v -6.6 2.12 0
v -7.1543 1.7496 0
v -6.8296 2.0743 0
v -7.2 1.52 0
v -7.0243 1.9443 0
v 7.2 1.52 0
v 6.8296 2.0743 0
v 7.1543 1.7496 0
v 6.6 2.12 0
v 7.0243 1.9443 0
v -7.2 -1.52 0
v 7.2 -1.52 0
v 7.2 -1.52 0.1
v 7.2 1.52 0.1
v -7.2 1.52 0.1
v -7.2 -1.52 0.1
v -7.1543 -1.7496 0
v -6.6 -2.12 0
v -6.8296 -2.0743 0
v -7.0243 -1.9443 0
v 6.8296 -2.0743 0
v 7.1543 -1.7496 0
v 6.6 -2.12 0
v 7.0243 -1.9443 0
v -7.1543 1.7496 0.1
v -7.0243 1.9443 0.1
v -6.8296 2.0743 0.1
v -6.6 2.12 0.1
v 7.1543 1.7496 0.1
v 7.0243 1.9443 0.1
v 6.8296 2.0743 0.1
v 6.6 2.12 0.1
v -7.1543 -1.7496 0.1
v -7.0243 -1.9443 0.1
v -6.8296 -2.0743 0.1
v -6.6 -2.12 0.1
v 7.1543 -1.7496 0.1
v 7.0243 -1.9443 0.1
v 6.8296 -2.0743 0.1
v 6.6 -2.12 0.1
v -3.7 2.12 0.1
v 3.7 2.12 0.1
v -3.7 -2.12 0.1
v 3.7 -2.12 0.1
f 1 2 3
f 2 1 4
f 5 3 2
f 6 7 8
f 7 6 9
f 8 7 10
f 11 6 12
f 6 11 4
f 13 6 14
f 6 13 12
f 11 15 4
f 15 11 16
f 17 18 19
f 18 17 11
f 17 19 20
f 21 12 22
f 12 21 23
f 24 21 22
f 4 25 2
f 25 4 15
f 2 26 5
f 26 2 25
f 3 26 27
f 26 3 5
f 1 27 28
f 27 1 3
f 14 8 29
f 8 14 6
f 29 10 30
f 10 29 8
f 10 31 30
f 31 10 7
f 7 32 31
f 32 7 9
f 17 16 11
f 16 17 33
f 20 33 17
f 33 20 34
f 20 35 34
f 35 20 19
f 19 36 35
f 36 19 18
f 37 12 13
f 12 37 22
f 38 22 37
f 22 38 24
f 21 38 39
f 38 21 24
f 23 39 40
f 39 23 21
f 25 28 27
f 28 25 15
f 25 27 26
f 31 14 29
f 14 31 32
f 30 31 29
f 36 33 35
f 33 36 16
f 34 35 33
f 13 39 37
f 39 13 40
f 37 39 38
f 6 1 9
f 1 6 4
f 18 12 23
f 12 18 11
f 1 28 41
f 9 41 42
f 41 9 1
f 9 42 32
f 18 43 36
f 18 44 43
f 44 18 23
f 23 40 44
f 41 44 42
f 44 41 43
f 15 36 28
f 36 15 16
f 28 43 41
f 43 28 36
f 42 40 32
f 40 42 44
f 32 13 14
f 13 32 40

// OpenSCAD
// file: ../p/box3u12.scad
use <../lib.scad>
function ldraw_lib__box3u12() = [
// 0 Box with 3 Parallel Faces without Any Edges
// 0 Name: box3u12.dat
// 0 Author: J.C. Tchang [tchang]
// 0 !LDRAW_ORG Primitive UPDATE 2014-02
// 0 !LICENSE Licensed under CC BY 4.0 : see CAreadme.txt
// 
// 0 BFC CERTIFY CCW
  [0,"BFC","CERTIFY"],
  [0,"BFC","CCW"],
// 
// 0 !HISTORY 2014-12-23 [PTadmin] Official Update 2014-02
// 
// 
// 4 16 -1 1 1 1 1 1 1 1 -1 -1 1 -1
  [4,16,-1,1,1,1,1,1,1,1,-1,-1,1,-1],
// 4 16 -1 1 1 -1 0 1 1 0 1 1 1 1
  [4,16,-1,1,1,-1,0,1,1,0,1,1,1,1],
// 4 16 1 1 -1 1 0 -1 -1 0 -1 -1 1 -1
  [4,16,1,1,-1,1,0,-1,-1,0,-1,-1,1,-1],
];
module ldraw_lib__box3u12(step=0, col=false, unit=2/5, alt=false, line=0.2, solid=!$preview)
    makepoly(ldraw_lib__box3u12(), step=step, col=col, unit=unit, alt=alt, line=line, solid=solid);
ldraw_lib__box3u12(line=0.2);
// file: ../p/1-4cyli.scad
use <../lib.scad>
function ldraw_lib__1_4cyli() = [
// 0 Cylinder 0.25
// 0 Name: 1-4cyli.dat
// 0 Author: James Jessiman
// 0 !LDRAW_ORG Primitive UPDATE 2012-01
// 0 !LICENSE Licensed under CC BY 4.0 : see CAreadme.txt
// 
// 0 BFC CERTIFY CCW
  [0,"BFC","CERTIFY"],
  [0,"BFC","CCW"],
// 
// 0 !HISTORY 2002-03-23 [sbliss] Added BFC statement.
// 0 !HISTORY 2002-04-25 [PTadmin] Official Update 2002-02
// 0 !HISTORY 2007-06-22 [PTadmin] Header formatted for Contributor Agreement
// 0 !HISTORY 2008-07-01 [PTadmin] Official Update 2008-01
// 0 !HISTORY 2012-02-16 [Philo] Changed to CCW
// 0 !HISTORY 2012-03-30 [PTadmin] Official Update 2012-01
// 
// 
// 4 16 1 1 0 0.9239 1 0.3827 0.9239 0 0.3827 1 0 0
  [4,16,1,1,0,0.9239,1,0.3827,0.9239,0,0.3827,1,0,0],
// 5 24 1 0 0 1 1 0 0.9239 0 0.3827 1 0 -1
  [5,24,1,0,0,1,1,0,0.9239,0,0.3827,1,0,-1],
// 4 16 0.9239 1 0.3827 0.7071 1 0.7071 0.7071 0 0.7071 0.9239 0 0.3827
  [4,16,0.9239,1,0.3827,0.7071,1,0.7071,0.7071,0,0.7071,0.9239,0,0.3827],
// 5 24 0.9239 0 0.3827 0.9239 1 0.3827 0.7071 0 0.7071 1 0 0
  [5,24,0.9239,0,0.3827,0.9239,1,0.3827,0.7071,0,0.7071,1,0,0],
// 4 16 0.7071 1 0.7071 0.3827 1 0.9239 0.3827 0 0.9239 0.7071 0 0.7071
  [4,16,0.7071,1,0.7071,0.3827,1,0.9239,0.3827,0,0.9239,0.7071,0,0.7071],
// 5 24 0.7071 0 0.7071 0.7071 1 0.7071 0.3827 0 0.9239 0.9239 0 0.3827
  [5,24,0.7071,0,0.7071,0.7071,1,0.7071,0.3827,0,0.9239,0.9239,0,0.3827],
// 4 16 0.3827 1 0.9239 0 1 1 0 0 1 0.3827 0 0.9239
  [4,16,0.3827,1,0.9239,0,1,1,0,0,1,0.3827,0,0.9239],
// 5 24 0.3827 0 0.9239 0.3827 1 0.9239 0 0 1 0.7071 0 0.7071
  [5,24,0.3827,0,0.9239,0.3827,1,0.9239,0,0,1,0.7071,0,0.7071],
// 5 24 0 0 1 0 1 1 0.3827 0 0.9239 -1 0 1
  [5,24,0,0,1,0,1,1,0.3827,0,0.9239,-1,0,1],
];
module ldraw_lib__1_4cyli(step=0, col=false, unit=2/5, alt=false, line=0.2, solid=!$preview)
    makepoly(ldraw_lib__1_4cyli(), step=step, col=col, unit=unit, alt=alt, line=line, solid=solid);
ldraw_lib__1_4cyli(line=0.2);
// file: ../p/1-4chrd.scad
use <../lib.scad>
function ldraw_lib__1_4chrd() = [
// 0 Chord 0.25
// 0 Name: 1-4chrd.dat
// 0 Author: Tony Hafner [hafhead]
// 0 !LDRAW_ORG Primitive UPDATE 2012-02
// 0 !LICENSE Licensed under CC BY 2.0 and CC BY 4.0 : see CAreadme.txt
// 
// 0 BFC CERTIFY CCW
  [0,"BFC","CERTIFY"],
  [0,"BFC","CCW"],
// 
// 0 !HISTORY 2004-04-22 [PTadmin] Official Update 2004-02
// 0 !HISTORY 2007-10-09 [PTadmin] Header formatted for Contributor Agreement
// 0 !HISTORY 2008-07-01 [PTadmin] Official Update 2008-01
// 0 !HISTORY 2012-08-02 [MMR1988] Re-creation with PrimGen2 and Rectifier
// 0 !HISTORY 2012-08-09 [PTadmin] Official Update 2012-02
// 
// 
// 4 16 0.9239 0 0.3827 0.3827 0 0.9239 0 0 1 1 0 0
  [4,16,0.9239,0,0.3827,0.3827,0,0.9239,0,0,1,1,0,0],
// 3 16 0.7071 0 0.7071 0.3827 0 0.9239 0.9239 0 0.3827
  [3,16,0.7071,0,0.7071,0.3827,0,0.9239,0.9239,0,0.3827],
];
module ldraw_lib__1_4chrd(step=0, col=false, unit=2/5, alt=false, line=0.2, solid=!$preview)
    makepoly(ldraw_lib__1_4chrd(), step=step, col=col, unit=unit, alt=alt, line=line, solid=solid);
ldraw_lib__1_4chrd(line=0.2);
// main file
use <../lib.scad>
use <../p/1-4chrd.scad>
use <../p/1-4cyli.scad>
use <../p/box3u12.scad>
function ldraw_lib__6142617b() = [
// 0 Sticker  0.5 x  1.8 with Black Stripe on White Background
// 0 Name: 6142617b.dat
// 0 Author: Massimo Maso [Sirio]
// 0 !LDRAW_ORG Part UPDATE 2022-04
// 0 !LICENSE Licensed under CC BY 4.0 : see CAreadme.txt
// 
// 0 BFC CERTIFY CCW
  [0,"BFC","CERTIFY"],
  [0,"BFC","CCW"],
// 
// 0 !KEYWORDS 1969, Camaro, Chevrolet, Drag, Race, Set 75874, Speed Champions
// 0 !KEYWORDS Z/28
// 
// 0 !HISTORY 2022-07-18 [PTadmin] Official Update 2022-04
// 
// 
// 0 // Primitives
// 
// 1 16 -16.5 0 3.8 -1.5 0 0 0 -1 0 0 0 1.5 1-4chrd.dat
  [1,16,-16.5,0,3.8,-1.5,0,0,0,-1,0,0,0,1.5, ldraw_lib__1_4chrd()],
// 1 16 16.5 0 3.8 1.5 0 0 0 -1 0 0 0 1.5 1-4chrd.dat
  [1,16,16.5,0,3.8,1.5,0,0,0,-1,0,0,0,1.5, ldraw_lib__1_4chrd()],
// 1 16 0 -.25 0 0 0 18 0 .25 0 3.8 0 0 box3u12.dat
  [1,16,0,-.25,0,0,0,18,0,.25,0,3.8,0,0, ldraw_lib__box3u12()],
// 1 16 -16.5 0 -3.8 -1.5 0 0 0 -1 0 0 0 -1.5 1-4chrd.dat
  [1,16,-16.5,0,-3.8,-1.5,0,0,0,-1,0,0,0,-1.5, ldraw_lib__1_4chrd()],
// 1 16 16.5 0 -3.8 1.5 0 0 0 -1 0 0 0 -1.5 1-4chrd.dat
  [1,16,16.5,0,-3.8,1.5,0,0,0,-1,0,0,0,-1.5, ldraw_lib__1_4chrd()],
// 1 16 -16.5 0 3.8 -1.5 0 0 0 -.25 0 0 0 1.5 1-4cyli.dat
  [1,16,-16.5,0,3.8,-1.5,0,0,0,-.25,0,0,0,1.5, ldraw_lib__1_4cyli()],
// 1 16 16.5 0 3.8 1.5 0 0 0 -.25 0 0 0 1.5 1-4cyli.dat
  [1,16,16.5,0,3.8,1.5,0,0,0,-.25,0,0,0,1.5, ldraw_lib__1_4cyli()],
// 1 16 -16.5 0 -3.8 -1.5 0 0 0 -.25 0 0 0 -1.5 1-4cyli.dat
  [1,16,-16.5,0,-3.8,-1.5,0,0,0,-.25,0,0,0,-1.5, ldraw_lib__1_4cyli()],
// 1 16 16.5 0 -3.8 1.5 0 0 0 -.25 0 0 0 -1.5 1-4cyli.dat
  [1,16,16.5,0,-3.8,1.5,0,0,0,-.25,0,0,0,-1.5, ldraw_lib__1_4cyli()],
// 1 15 -16.5 -.25 3.8 -1.5 0 0 0 1 0 0 0 1.5 1-4chrd.dat
  [1,15,-16.5,-.25,3.8,-1.5,0,0,0,1,0,0,0,1.5, ldraw_lib__1_4chrd()],
// 1 15 16.5 -.25 3.8 1.5 0 0 0 1 0 0 0 1.5 1-4chrd.dat
  [1,15,16.5,-.25,3.8,1.5,0,0,0,1,0,0,0,1.5, ldraw_lib__1_4chrd()],
// 1 15 -16.5 -.25 -3.8 -1.5 0 0 0 1 0 0 0 -1.5 1-4chrd.dat
  [1,15,-16.5,-.25,-3.8,-1.5,0,0,0,1,0,0,0,-1.5, ldraw_lib__1_4chrd()],
// 1 15 16.5 -.25 -3.8 1.5 0 0 0 1 0 0 0 -1.5 1-4chrd.dat
  [1,15,16.5,-.25,-3.8,1.5,0,0,0,1,0,0,0,-1.5, ldraw_lib__1_4chrd()],
// 0 // Bottom face
// 4 16 16.5 0 5.3 18 0 3.8 -18 0 3.8 -16.5 0 5.3
  [4,16,16.5,0,5.3,18,0,3.8,-18,0,3.8,-16.5,0,5.3],
// 4 16 16.5 0 -5.3 -16.5 0 -5.3 -18 0 -3.8 18 0 -3.8
  [4,16,16.5,0,-5.3,-16.5,0,-5.3,-18,0,-3.8,18,0,-3.8],
// 0 // Lateral face
// 3 16 -16.5 0 5.3 -16.5 -.25 5.3 -9.25 -.25 5.3
  [3,16,-16.5,0,5.3,-16.5,-.25,5.3,-9.25,-.25,5.3],
// 4 16 -16.5 0 5.3 -9.25 -.25 5.3 9.25 -.25 5.3 16.5 0 5.3
  [4,16,-16.5,0,5.3,-9.25,-.25,5.3,9.25,-.25,5.3,16.5,0,5.3],
// 3 16 16.5 0 5.3 9.25 -.25 5.3 16.5 -.25 5.3
  [3,16,16.5,0,5.3,9.25,-.25,5.3,16.5,-.25,5.3],
// 3 16 -16.5 0 -5.3 -9.25 -.25 -5.3 -16.5 -.25 -5.3
  [3,16,-16.5,0,-5.3,-9.25,-.25,-5.3,-16.5,-.25,-5.3],
// 4 16 -16.5 0 -5.3 16.5 0 -5.3 9.25 -.25 -5.3 -9.25 -.25 -5.3
  [4,16,-16.5,0,-5.3,16.5,0,-5.3,9.25,-.25,-5.3,-9.25,-.25,-5.3],
// 3 16 16.5 0 -5.3 16.5 -.25 -5.3 9.25 -.25 -5.3
  [3,16,16.5,0,-5.3,16.5,-.25,-5.3,9.25,-.25,-5.3],
// 0 // Top face
// 0 // Black face
// 4 0 -9.25 -.25 5.3 -9.25 -.25 -5.3 9.25 -.25 -5.3 9.25 -.25 5.3
  [4,0,-9.25,-.25,5.3,-9.25,-.25,-5.3,9.25,-.25,-5.3,9.25,-.25,5.3],
// 0 // White faces
// 4 15 -16.5 -.25 5.3 -18 -.25 3.8 -18 -.25 -3.8 -16.5 -.25 -5.3
  [4,15,-16.5,-.25,5.3,-18,-.25,3.8,-18,-.25,-3.8,-16.5,-.25,-5.3],
// 4 15 -16.5 -.25 5.3 -16.5 -.25 -5.3 -9.25 -.25 -5.3 -9.25 -.25 5.3
  [4,15,-16.5,-.25,5.3,-16.5,-.25,-5.3,-9.25,-.25,-5.3,-9.25,-.25,5.3],
// 4 15 16.5 -.25 5.3 9.25 -.25 5.3 9.25 -.25 -5.3 16.5 -.25 -5.3
  [4,15,16.5,-.25,5.3,9.25,-.25,5.3,9.25,-.25,-5.3,16.5,-.25,-5.3],
// 4 15 16.5 -.25 5.3 16.5 -.25 -5.3 18 -.25 -3.8 18 -.25 3.8
  [4,15,16.5,-.25,5.3,16.5,-.25,-5.3,18,-.25,-3.8,18,-.25,3.8],
];
module ldraw_lib__6142617b(step=0, col=false, unit=2/5, alt=false, line=0.2, solid=!$preview)
    makepoly(ldraw_lib__6142617b(), step=step, col=col, unit=unit, alt=alt, line=line, solid=solid);
ldraw_lib__6142617b(line=0.2);
